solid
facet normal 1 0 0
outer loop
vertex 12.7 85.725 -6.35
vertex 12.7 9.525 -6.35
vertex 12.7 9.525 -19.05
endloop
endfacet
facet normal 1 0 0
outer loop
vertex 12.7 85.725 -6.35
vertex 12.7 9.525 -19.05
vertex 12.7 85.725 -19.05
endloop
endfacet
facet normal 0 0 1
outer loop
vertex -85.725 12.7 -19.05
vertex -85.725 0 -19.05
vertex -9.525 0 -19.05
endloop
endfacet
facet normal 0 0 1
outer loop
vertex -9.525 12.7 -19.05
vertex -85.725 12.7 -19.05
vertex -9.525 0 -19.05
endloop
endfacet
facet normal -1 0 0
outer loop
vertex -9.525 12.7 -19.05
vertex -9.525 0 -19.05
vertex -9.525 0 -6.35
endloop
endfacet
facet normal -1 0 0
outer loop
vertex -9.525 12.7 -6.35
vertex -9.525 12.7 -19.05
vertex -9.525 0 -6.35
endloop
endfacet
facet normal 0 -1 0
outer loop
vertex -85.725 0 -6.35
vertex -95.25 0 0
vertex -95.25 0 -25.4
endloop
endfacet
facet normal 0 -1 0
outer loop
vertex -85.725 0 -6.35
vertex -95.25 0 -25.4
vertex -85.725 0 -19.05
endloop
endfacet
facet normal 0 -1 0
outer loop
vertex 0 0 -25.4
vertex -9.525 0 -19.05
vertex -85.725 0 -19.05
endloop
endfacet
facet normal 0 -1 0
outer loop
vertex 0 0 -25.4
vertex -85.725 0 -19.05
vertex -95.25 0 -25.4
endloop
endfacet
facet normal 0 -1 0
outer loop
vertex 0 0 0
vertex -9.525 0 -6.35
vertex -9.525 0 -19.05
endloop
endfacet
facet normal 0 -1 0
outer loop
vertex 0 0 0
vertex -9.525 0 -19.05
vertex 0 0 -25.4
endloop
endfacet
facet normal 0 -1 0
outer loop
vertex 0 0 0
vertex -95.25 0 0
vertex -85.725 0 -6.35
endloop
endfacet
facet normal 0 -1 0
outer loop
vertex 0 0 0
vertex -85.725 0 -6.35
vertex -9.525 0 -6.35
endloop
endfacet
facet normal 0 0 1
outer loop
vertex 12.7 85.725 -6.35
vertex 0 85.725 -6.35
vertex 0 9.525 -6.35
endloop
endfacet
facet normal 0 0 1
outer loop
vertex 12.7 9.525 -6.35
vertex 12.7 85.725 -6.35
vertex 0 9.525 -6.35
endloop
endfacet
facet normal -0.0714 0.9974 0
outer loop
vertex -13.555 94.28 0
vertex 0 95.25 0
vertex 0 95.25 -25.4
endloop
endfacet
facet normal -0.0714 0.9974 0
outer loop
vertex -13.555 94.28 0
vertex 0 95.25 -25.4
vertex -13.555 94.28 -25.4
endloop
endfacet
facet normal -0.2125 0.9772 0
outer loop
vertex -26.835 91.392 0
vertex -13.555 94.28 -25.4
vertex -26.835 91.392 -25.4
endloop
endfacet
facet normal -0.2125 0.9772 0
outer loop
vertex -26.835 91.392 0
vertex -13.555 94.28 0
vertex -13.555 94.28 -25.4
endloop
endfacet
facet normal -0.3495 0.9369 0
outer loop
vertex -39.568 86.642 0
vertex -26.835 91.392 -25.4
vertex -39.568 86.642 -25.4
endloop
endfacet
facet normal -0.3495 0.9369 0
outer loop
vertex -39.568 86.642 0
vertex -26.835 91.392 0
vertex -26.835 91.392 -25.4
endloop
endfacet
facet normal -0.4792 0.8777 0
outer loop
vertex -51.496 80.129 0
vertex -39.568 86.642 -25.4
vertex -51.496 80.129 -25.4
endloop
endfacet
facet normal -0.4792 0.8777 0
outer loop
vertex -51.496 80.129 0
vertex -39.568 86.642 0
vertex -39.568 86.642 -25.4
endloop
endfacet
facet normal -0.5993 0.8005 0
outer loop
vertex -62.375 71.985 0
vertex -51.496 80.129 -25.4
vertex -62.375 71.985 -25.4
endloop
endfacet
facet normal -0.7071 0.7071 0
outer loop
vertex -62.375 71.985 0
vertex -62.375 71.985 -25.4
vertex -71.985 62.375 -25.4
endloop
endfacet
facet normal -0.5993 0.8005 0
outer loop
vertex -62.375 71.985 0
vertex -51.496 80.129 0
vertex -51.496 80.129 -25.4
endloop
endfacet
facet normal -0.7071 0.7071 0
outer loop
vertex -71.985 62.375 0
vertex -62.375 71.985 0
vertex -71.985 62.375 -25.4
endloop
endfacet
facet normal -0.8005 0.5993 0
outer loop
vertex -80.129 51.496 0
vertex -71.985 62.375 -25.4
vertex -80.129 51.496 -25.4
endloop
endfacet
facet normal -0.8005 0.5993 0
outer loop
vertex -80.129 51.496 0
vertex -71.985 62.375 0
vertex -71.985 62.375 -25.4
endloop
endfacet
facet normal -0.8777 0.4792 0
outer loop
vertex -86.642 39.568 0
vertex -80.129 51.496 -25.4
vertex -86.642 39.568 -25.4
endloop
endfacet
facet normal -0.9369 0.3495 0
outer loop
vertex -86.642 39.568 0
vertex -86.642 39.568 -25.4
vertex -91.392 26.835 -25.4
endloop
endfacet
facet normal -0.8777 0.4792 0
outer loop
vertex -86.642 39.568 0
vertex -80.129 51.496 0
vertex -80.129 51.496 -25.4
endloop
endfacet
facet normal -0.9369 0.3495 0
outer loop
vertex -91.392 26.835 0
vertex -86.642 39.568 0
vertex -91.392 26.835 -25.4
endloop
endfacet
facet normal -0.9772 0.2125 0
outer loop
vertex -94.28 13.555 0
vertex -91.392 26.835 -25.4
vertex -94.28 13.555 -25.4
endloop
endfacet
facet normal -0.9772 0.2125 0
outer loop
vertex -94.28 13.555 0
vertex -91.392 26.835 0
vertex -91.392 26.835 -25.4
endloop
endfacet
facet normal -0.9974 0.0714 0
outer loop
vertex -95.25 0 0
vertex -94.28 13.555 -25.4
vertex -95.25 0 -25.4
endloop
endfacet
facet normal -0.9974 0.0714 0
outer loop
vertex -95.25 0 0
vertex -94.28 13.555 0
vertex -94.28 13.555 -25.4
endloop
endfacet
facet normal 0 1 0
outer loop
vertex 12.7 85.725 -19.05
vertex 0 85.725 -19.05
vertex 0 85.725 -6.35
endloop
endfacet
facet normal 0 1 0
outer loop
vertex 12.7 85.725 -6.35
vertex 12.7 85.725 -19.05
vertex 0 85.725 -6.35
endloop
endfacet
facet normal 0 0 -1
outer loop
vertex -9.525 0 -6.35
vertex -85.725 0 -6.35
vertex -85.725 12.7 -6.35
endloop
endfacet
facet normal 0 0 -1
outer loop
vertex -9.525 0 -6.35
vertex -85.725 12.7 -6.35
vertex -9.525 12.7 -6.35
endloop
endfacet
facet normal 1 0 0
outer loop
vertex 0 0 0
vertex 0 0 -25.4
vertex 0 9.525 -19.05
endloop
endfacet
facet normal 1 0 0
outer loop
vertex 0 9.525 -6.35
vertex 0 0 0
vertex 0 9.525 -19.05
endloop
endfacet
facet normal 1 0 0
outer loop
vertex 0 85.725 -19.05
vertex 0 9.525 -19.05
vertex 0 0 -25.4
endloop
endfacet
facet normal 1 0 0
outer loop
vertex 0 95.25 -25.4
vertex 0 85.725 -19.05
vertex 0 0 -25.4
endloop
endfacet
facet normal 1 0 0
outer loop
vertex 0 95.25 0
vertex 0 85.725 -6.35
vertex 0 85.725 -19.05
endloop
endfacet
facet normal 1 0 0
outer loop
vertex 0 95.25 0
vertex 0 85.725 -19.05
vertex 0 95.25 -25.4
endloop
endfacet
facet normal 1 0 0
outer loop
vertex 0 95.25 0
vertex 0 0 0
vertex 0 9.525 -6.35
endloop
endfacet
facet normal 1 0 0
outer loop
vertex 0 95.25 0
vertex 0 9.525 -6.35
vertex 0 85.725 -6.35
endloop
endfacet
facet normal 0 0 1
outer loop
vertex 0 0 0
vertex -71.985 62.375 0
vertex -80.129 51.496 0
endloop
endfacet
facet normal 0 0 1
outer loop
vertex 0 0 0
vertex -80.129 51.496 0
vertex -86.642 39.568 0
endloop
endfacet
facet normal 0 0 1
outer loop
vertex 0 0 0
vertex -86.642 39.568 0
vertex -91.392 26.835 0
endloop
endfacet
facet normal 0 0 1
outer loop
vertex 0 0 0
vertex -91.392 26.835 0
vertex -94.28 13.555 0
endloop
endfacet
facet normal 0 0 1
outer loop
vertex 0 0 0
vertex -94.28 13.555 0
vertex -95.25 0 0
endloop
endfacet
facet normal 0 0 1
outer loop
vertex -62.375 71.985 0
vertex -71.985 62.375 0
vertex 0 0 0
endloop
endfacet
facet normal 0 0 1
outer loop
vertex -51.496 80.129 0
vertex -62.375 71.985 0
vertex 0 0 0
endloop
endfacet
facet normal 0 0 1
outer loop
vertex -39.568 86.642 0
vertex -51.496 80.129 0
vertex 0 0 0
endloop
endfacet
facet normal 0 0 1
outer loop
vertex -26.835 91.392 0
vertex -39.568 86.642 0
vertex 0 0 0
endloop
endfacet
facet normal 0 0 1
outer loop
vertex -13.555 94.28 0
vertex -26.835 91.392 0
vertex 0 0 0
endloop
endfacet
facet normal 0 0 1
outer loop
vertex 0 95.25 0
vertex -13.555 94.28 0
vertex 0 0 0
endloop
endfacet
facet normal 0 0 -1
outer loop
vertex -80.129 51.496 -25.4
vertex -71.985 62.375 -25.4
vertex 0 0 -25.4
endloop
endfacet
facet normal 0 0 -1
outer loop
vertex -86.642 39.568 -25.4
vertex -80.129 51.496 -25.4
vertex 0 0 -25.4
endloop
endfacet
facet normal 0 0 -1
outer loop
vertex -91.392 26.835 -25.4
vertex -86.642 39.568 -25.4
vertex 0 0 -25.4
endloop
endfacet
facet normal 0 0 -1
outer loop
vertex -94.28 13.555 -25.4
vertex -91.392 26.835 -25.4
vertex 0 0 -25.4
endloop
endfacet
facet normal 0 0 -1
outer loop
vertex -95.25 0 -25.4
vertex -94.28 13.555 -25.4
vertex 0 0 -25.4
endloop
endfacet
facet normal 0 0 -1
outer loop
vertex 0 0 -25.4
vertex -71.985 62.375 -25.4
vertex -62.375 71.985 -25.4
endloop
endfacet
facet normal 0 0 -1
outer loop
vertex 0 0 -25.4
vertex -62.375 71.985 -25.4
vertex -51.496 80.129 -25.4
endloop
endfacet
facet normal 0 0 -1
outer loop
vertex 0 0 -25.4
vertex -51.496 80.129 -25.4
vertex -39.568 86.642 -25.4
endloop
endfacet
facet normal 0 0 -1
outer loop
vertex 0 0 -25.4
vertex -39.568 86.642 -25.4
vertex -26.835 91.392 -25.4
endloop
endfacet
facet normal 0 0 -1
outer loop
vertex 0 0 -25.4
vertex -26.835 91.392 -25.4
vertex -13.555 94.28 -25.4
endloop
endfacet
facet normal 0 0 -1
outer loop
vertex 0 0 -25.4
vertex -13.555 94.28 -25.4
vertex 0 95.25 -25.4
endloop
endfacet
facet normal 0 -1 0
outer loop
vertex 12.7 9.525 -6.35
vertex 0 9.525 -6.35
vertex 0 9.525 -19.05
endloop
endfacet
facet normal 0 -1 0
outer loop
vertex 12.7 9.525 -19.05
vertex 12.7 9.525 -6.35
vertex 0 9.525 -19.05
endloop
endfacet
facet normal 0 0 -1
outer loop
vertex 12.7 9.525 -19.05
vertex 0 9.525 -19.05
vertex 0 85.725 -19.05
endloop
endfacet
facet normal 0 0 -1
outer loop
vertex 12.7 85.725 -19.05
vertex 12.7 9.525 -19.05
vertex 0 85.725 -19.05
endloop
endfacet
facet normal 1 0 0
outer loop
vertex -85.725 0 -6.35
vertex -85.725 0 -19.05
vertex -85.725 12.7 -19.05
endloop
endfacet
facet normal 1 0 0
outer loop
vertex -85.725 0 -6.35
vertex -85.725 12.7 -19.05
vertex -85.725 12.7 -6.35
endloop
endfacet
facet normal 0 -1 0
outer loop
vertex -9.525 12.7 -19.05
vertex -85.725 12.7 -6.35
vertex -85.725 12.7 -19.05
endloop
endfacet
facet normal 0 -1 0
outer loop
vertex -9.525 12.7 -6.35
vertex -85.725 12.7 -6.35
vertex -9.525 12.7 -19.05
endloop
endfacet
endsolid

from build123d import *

# Parameters (mm, degrees)
F1_DEPTH = 25.4
F2_W     = 76.2
F2_H     = 12.7
F3_DEPTH = 12.7
F5_DEPTH = 12.7


with BuildPart() as f1:
    # F0 (on Top) → F1 (new body)
    with BuildSketch(Plane.XY):
        with BuildLine():
            Line((-95.25, 0), (0, 0))
            Line((0, 0), (0, 95.25))
            ThreePointArc((0, 95.25), (-67.351921, 67.351921), (-95.25, 0))
        make_face()
    extrude(amount=-F1_DEPTH)

    # F2 (on face) → F3 (cut)
    with BuildSketch(Plane.XZ):
        with Locations((-47.625, -12.7)):
            Rectangle(F2_W, F2_H)
    extrude(amount=-F3_DEPTH, mode=Mode.SUBTRACT)

    # F4 (on face) → F5 (join)
    with BuildSketch(Plane.YZ):
        Polygon((9.525, -6.35), (9.525, -12.7), (9.525, -19.05), (47.625, -19.05), (85.725, -19.05), (85.725, -12.7), (85.725, -6.35), (47.625, -6.35), align=None)
    extrude(amount=F5_DEPTH)


solid = f1.part
